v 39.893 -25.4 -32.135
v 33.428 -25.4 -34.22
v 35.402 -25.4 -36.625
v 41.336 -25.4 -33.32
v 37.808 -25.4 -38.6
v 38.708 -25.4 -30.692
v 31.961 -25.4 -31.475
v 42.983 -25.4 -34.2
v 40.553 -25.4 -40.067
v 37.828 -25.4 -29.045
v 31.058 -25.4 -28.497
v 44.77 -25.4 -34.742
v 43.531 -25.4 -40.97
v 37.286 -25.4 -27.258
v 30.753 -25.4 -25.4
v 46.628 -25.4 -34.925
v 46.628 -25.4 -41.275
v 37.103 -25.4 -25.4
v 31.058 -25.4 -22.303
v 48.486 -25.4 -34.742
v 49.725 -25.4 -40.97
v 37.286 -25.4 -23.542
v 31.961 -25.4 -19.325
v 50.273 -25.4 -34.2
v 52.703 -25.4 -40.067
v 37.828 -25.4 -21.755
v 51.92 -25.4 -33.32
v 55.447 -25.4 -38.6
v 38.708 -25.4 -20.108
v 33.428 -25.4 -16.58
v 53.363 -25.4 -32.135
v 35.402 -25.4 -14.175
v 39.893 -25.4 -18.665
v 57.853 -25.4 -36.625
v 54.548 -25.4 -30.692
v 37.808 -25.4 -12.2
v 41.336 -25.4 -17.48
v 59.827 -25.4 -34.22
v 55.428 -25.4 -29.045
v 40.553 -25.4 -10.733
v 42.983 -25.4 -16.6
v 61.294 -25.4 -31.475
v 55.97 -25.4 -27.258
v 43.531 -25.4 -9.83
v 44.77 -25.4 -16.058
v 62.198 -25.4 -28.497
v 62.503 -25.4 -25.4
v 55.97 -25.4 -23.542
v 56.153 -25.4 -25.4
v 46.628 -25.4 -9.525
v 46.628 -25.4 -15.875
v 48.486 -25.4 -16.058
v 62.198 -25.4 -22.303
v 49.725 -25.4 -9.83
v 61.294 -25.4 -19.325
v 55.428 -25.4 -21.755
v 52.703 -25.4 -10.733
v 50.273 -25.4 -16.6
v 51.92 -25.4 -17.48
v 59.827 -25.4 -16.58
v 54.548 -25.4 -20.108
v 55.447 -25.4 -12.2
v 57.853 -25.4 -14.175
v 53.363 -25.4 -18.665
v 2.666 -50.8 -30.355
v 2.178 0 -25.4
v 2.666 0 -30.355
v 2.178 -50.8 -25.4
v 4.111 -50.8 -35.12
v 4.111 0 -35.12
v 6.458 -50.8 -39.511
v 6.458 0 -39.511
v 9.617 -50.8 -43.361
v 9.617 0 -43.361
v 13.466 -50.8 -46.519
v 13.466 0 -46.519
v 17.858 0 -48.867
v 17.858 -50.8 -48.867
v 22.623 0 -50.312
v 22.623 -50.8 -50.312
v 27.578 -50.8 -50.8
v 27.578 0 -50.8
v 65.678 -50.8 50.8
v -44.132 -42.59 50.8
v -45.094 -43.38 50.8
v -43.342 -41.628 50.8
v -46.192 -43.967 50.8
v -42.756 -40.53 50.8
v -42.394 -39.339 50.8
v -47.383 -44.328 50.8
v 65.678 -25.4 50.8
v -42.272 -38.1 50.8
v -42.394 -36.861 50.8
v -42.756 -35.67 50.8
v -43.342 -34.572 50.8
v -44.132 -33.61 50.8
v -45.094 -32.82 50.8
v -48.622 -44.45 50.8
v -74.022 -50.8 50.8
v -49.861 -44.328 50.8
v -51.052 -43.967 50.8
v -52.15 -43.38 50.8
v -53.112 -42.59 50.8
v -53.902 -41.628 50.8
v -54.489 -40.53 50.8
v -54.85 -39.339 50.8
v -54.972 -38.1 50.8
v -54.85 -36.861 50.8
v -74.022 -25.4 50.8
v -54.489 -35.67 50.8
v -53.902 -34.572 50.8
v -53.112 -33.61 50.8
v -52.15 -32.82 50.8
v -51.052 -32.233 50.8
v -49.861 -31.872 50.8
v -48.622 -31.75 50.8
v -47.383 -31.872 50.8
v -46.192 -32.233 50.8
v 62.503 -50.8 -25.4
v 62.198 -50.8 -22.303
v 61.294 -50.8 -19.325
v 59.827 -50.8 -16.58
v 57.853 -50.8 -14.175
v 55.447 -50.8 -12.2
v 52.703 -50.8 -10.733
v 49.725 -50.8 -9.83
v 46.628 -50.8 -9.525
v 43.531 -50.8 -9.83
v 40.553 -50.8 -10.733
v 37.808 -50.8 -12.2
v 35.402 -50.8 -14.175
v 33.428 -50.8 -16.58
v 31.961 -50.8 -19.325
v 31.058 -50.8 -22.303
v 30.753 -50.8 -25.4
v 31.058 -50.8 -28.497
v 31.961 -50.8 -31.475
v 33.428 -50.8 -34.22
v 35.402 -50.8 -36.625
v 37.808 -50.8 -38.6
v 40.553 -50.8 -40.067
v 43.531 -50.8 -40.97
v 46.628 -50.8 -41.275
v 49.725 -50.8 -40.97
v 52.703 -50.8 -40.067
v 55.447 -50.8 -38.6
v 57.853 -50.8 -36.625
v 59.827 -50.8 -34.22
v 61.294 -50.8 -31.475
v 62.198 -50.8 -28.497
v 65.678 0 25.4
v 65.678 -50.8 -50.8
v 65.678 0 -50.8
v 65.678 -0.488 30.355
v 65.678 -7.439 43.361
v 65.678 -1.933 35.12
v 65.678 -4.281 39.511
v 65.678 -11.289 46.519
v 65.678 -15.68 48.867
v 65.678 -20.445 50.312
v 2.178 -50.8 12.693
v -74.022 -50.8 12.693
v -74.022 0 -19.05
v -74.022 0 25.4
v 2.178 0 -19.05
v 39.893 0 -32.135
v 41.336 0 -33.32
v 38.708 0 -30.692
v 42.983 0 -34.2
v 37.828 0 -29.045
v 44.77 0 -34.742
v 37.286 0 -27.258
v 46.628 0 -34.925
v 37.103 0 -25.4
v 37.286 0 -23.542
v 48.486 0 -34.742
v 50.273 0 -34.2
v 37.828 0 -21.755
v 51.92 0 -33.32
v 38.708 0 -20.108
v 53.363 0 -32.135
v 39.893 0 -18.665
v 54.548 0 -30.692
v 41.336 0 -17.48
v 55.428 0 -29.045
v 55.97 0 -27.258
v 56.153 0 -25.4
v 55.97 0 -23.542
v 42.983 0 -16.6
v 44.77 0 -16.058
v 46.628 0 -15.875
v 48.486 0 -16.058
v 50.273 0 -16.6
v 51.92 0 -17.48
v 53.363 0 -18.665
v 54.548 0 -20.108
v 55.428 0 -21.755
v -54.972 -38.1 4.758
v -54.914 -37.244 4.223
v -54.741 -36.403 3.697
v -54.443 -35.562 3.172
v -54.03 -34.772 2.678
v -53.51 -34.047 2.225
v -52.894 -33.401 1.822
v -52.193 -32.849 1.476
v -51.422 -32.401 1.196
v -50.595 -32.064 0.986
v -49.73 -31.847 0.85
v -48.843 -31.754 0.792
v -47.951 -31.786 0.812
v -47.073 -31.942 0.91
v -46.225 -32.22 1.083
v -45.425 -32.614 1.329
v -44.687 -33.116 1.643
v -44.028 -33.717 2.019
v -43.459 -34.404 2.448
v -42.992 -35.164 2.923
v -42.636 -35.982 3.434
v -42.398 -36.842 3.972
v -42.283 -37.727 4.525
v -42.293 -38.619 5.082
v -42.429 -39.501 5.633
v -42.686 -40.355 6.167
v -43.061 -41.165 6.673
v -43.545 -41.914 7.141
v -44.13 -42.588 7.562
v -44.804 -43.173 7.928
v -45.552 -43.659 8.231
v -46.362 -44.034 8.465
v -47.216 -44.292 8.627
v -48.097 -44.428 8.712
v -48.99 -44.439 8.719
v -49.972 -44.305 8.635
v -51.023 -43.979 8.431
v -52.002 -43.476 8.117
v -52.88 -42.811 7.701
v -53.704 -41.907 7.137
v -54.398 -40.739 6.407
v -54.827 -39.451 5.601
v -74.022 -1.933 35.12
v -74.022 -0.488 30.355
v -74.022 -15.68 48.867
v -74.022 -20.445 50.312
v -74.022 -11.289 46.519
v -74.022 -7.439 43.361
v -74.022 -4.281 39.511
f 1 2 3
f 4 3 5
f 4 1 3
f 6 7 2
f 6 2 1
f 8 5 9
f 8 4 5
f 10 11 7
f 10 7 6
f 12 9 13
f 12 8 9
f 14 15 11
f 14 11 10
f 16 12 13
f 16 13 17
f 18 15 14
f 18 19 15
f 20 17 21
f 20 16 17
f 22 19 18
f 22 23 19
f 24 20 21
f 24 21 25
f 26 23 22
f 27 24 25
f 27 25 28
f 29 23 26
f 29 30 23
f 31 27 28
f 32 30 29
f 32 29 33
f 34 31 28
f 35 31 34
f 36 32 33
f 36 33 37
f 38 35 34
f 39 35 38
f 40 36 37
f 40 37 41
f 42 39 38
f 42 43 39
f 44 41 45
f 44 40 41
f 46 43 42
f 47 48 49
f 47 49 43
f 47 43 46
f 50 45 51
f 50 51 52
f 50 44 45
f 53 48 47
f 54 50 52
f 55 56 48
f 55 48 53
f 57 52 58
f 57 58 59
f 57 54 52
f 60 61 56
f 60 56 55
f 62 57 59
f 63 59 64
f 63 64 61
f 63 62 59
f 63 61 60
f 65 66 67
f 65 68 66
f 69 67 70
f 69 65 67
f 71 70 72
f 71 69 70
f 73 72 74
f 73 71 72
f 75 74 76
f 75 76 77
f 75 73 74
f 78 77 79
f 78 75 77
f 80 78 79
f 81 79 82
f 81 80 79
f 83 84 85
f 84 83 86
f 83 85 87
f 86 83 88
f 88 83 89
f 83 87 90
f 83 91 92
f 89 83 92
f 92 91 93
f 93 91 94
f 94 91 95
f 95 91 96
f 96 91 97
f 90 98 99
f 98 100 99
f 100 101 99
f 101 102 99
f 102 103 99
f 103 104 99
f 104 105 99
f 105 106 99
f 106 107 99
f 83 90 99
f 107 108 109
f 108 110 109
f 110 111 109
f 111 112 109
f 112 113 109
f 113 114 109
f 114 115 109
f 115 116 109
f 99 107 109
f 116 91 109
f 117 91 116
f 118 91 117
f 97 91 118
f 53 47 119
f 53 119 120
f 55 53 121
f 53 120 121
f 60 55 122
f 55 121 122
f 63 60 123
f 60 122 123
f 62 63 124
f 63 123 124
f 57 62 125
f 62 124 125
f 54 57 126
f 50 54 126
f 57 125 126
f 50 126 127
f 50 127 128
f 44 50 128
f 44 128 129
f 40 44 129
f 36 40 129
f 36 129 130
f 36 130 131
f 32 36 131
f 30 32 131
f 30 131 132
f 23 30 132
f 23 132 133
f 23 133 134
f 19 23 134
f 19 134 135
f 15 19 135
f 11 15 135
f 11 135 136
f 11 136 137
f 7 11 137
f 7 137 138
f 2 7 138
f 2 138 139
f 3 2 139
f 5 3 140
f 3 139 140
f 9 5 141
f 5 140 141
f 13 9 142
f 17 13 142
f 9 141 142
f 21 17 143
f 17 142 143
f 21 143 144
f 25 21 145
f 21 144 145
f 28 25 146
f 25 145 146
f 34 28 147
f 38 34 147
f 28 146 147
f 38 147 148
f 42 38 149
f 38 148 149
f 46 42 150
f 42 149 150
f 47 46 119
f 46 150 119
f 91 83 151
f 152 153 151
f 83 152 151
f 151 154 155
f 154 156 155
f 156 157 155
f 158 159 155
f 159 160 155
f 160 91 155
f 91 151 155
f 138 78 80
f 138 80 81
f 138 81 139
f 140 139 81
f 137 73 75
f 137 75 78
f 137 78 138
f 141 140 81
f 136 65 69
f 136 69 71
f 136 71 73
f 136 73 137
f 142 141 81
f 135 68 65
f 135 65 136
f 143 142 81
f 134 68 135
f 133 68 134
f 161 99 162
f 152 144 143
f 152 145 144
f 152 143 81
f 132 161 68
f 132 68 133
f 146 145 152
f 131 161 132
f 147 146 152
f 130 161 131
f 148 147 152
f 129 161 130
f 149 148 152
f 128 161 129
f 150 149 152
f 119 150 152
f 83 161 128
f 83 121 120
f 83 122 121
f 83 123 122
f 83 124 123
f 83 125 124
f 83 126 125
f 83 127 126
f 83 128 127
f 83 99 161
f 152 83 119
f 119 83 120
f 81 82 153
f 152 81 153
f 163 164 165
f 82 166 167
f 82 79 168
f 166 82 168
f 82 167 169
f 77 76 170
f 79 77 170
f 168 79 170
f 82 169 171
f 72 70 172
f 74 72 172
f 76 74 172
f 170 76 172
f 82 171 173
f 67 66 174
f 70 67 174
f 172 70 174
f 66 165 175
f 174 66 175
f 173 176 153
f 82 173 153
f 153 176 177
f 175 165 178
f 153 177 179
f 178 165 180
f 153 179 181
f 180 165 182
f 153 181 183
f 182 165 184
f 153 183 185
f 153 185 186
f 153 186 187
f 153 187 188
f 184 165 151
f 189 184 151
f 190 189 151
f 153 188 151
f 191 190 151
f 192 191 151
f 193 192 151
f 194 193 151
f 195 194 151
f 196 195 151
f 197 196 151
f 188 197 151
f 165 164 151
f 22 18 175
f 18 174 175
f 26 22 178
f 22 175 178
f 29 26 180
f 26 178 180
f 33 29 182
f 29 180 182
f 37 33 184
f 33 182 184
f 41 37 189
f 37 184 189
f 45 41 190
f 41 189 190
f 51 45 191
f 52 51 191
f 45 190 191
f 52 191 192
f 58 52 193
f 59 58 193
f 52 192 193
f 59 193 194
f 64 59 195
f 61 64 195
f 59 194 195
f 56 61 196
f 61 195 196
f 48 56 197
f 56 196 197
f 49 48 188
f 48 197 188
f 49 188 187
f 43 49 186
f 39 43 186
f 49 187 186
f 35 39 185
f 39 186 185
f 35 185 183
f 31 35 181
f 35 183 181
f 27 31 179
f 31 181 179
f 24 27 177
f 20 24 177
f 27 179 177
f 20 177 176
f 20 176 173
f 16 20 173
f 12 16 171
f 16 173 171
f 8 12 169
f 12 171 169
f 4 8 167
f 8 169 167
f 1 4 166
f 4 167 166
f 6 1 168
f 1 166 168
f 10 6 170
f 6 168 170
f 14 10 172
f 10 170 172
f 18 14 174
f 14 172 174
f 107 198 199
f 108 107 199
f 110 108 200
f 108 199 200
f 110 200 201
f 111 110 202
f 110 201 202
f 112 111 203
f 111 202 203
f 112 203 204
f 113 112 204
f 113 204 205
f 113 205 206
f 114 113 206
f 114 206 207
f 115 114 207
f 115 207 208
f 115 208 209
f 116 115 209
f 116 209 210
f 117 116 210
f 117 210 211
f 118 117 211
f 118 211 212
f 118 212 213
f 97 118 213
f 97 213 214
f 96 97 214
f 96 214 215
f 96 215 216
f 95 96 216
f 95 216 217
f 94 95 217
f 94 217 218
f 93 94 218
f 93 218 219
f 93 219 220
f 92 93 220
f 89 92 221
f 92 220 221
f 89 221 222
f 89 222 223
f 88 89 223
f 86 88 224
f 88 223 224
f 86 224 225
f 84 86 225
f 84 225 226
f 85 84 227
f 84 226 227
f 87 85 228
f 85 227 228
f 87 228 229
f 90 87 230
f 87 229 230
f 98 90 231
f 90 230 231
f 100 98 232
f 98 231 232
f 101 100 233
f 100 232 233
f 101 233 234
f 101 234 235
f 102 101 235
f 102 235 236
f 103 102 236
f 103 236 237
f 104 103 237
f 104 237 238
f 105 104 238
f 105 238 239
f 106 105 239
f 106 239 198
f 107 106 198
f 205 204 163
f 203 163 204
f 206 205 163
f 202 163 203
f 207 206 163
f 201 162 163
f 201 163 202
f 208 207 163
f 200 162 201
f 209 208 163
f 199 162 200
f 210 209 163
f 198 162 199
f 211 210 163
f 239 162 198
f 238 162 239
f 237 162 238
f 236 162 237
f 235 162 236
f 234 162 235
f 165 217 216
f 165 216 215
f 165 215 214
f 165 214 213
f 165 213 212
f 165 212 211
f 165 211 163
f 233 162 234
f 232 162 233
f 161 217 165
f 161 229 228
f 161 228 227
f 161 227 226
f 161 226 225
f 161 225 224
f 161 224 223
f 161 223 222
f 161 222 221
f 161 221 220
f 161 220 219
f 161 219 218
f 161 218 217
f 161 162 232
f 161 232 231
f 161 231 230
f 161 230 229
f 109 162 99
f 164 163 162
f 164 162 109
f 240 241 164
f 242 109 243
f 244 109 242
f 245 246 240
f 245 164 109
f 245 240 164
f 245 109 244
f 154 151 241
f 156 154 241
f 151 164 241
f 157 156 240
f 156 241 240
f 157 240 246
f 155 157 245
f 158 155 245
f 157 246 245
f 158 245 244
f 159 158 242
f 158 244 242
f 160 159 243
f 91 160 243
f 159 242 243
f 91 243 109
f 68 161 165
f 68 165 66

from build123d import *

# Parameters (mm, degrees)
F0_R           = 15.875
F0_W           = 76.2
F0_H           = 69.85
F1_DEPTH       = 50.8
F2_R           = 25.4
F3_R           = 25.4
F5_SIZE2       = 31.743353
F5_SIZE        = 50.79999
F7_D           = 12.7
F8_D           = 19.05
F8_CBORE_D     = 31.75
F8_CBORE_DEPTH = 25.4


# Not quite as in the source:
# - a fillet or chamfer is up to 0.001 mm smaller than in the source, because OpenCascade refuses the exact size


with BuildPart() as f1:
    # F0 (on Front) → F1 (new body)
    with BuildSketch(Plane.XZ):
        Polygon((65.6778021347, 50.8), (2.1778021347, 50.8), (2.1778021347, -19.05), (2.1778021347, -50.8), (65.6778021347, -50.8), align=None)
        with Locations((46.6278021347, -25.4)):
            Circle(F0_R, mode=Mode.SUBTRACT)
        with Locations((46.6278021347, -25.4)):
            Circle(F0_R)
        with Locations((-35.9221978653, 15.875)):
            Rectangle(F0_W, F0_H)
    extrude(amount=F1_DEPTH)

    # F2
    f2_edges = [f1.edges().sort_by_distance(p)[0] for p in [
        (2.177802, -25.4, -50.8),
    ]]
    fillet(f2_edges, radius=F2_R)

    # F3
    f3_edges = [f1.edges().sort_by_distance(p)[0] for p in [
        (-4.172198, 0, 50.8),
    ]]
    fillet(f3_edges, radius=F3_R)

    # F5 (size 50.8 and 31.743363077 in the source; OpenCascade refuses exactly that, so slightly less here)
    f5_edges = [f1.edges().sort_by_distance(p)[0] for p in [
        (-35.922198, -50.8, -19.05),
    ]]
    f5_side = f1.faces().sort_by_distance((-35.922198, -25.4, -19.05))[0]
    chamfer(f5_edges, length=F5_SIZE, length2=F5_SIZE2, reference=f5_side)

    # F7 (through all)
    with Locations(Plane.XY.offset(50.8)):
        with Locations((-48.6221978653, -38.1)):
            Hole(F7_D / 2)

    # F8 (through all)
    with Locations(Plane.XZ.offset(50.8)):
        with Locations((46.6278021347, -25.4)):
            CounterBoreHole(F8_D / 2, F8_CBORE_D / 2, F8_CBORE_DEPTH)


solid = f1.part
